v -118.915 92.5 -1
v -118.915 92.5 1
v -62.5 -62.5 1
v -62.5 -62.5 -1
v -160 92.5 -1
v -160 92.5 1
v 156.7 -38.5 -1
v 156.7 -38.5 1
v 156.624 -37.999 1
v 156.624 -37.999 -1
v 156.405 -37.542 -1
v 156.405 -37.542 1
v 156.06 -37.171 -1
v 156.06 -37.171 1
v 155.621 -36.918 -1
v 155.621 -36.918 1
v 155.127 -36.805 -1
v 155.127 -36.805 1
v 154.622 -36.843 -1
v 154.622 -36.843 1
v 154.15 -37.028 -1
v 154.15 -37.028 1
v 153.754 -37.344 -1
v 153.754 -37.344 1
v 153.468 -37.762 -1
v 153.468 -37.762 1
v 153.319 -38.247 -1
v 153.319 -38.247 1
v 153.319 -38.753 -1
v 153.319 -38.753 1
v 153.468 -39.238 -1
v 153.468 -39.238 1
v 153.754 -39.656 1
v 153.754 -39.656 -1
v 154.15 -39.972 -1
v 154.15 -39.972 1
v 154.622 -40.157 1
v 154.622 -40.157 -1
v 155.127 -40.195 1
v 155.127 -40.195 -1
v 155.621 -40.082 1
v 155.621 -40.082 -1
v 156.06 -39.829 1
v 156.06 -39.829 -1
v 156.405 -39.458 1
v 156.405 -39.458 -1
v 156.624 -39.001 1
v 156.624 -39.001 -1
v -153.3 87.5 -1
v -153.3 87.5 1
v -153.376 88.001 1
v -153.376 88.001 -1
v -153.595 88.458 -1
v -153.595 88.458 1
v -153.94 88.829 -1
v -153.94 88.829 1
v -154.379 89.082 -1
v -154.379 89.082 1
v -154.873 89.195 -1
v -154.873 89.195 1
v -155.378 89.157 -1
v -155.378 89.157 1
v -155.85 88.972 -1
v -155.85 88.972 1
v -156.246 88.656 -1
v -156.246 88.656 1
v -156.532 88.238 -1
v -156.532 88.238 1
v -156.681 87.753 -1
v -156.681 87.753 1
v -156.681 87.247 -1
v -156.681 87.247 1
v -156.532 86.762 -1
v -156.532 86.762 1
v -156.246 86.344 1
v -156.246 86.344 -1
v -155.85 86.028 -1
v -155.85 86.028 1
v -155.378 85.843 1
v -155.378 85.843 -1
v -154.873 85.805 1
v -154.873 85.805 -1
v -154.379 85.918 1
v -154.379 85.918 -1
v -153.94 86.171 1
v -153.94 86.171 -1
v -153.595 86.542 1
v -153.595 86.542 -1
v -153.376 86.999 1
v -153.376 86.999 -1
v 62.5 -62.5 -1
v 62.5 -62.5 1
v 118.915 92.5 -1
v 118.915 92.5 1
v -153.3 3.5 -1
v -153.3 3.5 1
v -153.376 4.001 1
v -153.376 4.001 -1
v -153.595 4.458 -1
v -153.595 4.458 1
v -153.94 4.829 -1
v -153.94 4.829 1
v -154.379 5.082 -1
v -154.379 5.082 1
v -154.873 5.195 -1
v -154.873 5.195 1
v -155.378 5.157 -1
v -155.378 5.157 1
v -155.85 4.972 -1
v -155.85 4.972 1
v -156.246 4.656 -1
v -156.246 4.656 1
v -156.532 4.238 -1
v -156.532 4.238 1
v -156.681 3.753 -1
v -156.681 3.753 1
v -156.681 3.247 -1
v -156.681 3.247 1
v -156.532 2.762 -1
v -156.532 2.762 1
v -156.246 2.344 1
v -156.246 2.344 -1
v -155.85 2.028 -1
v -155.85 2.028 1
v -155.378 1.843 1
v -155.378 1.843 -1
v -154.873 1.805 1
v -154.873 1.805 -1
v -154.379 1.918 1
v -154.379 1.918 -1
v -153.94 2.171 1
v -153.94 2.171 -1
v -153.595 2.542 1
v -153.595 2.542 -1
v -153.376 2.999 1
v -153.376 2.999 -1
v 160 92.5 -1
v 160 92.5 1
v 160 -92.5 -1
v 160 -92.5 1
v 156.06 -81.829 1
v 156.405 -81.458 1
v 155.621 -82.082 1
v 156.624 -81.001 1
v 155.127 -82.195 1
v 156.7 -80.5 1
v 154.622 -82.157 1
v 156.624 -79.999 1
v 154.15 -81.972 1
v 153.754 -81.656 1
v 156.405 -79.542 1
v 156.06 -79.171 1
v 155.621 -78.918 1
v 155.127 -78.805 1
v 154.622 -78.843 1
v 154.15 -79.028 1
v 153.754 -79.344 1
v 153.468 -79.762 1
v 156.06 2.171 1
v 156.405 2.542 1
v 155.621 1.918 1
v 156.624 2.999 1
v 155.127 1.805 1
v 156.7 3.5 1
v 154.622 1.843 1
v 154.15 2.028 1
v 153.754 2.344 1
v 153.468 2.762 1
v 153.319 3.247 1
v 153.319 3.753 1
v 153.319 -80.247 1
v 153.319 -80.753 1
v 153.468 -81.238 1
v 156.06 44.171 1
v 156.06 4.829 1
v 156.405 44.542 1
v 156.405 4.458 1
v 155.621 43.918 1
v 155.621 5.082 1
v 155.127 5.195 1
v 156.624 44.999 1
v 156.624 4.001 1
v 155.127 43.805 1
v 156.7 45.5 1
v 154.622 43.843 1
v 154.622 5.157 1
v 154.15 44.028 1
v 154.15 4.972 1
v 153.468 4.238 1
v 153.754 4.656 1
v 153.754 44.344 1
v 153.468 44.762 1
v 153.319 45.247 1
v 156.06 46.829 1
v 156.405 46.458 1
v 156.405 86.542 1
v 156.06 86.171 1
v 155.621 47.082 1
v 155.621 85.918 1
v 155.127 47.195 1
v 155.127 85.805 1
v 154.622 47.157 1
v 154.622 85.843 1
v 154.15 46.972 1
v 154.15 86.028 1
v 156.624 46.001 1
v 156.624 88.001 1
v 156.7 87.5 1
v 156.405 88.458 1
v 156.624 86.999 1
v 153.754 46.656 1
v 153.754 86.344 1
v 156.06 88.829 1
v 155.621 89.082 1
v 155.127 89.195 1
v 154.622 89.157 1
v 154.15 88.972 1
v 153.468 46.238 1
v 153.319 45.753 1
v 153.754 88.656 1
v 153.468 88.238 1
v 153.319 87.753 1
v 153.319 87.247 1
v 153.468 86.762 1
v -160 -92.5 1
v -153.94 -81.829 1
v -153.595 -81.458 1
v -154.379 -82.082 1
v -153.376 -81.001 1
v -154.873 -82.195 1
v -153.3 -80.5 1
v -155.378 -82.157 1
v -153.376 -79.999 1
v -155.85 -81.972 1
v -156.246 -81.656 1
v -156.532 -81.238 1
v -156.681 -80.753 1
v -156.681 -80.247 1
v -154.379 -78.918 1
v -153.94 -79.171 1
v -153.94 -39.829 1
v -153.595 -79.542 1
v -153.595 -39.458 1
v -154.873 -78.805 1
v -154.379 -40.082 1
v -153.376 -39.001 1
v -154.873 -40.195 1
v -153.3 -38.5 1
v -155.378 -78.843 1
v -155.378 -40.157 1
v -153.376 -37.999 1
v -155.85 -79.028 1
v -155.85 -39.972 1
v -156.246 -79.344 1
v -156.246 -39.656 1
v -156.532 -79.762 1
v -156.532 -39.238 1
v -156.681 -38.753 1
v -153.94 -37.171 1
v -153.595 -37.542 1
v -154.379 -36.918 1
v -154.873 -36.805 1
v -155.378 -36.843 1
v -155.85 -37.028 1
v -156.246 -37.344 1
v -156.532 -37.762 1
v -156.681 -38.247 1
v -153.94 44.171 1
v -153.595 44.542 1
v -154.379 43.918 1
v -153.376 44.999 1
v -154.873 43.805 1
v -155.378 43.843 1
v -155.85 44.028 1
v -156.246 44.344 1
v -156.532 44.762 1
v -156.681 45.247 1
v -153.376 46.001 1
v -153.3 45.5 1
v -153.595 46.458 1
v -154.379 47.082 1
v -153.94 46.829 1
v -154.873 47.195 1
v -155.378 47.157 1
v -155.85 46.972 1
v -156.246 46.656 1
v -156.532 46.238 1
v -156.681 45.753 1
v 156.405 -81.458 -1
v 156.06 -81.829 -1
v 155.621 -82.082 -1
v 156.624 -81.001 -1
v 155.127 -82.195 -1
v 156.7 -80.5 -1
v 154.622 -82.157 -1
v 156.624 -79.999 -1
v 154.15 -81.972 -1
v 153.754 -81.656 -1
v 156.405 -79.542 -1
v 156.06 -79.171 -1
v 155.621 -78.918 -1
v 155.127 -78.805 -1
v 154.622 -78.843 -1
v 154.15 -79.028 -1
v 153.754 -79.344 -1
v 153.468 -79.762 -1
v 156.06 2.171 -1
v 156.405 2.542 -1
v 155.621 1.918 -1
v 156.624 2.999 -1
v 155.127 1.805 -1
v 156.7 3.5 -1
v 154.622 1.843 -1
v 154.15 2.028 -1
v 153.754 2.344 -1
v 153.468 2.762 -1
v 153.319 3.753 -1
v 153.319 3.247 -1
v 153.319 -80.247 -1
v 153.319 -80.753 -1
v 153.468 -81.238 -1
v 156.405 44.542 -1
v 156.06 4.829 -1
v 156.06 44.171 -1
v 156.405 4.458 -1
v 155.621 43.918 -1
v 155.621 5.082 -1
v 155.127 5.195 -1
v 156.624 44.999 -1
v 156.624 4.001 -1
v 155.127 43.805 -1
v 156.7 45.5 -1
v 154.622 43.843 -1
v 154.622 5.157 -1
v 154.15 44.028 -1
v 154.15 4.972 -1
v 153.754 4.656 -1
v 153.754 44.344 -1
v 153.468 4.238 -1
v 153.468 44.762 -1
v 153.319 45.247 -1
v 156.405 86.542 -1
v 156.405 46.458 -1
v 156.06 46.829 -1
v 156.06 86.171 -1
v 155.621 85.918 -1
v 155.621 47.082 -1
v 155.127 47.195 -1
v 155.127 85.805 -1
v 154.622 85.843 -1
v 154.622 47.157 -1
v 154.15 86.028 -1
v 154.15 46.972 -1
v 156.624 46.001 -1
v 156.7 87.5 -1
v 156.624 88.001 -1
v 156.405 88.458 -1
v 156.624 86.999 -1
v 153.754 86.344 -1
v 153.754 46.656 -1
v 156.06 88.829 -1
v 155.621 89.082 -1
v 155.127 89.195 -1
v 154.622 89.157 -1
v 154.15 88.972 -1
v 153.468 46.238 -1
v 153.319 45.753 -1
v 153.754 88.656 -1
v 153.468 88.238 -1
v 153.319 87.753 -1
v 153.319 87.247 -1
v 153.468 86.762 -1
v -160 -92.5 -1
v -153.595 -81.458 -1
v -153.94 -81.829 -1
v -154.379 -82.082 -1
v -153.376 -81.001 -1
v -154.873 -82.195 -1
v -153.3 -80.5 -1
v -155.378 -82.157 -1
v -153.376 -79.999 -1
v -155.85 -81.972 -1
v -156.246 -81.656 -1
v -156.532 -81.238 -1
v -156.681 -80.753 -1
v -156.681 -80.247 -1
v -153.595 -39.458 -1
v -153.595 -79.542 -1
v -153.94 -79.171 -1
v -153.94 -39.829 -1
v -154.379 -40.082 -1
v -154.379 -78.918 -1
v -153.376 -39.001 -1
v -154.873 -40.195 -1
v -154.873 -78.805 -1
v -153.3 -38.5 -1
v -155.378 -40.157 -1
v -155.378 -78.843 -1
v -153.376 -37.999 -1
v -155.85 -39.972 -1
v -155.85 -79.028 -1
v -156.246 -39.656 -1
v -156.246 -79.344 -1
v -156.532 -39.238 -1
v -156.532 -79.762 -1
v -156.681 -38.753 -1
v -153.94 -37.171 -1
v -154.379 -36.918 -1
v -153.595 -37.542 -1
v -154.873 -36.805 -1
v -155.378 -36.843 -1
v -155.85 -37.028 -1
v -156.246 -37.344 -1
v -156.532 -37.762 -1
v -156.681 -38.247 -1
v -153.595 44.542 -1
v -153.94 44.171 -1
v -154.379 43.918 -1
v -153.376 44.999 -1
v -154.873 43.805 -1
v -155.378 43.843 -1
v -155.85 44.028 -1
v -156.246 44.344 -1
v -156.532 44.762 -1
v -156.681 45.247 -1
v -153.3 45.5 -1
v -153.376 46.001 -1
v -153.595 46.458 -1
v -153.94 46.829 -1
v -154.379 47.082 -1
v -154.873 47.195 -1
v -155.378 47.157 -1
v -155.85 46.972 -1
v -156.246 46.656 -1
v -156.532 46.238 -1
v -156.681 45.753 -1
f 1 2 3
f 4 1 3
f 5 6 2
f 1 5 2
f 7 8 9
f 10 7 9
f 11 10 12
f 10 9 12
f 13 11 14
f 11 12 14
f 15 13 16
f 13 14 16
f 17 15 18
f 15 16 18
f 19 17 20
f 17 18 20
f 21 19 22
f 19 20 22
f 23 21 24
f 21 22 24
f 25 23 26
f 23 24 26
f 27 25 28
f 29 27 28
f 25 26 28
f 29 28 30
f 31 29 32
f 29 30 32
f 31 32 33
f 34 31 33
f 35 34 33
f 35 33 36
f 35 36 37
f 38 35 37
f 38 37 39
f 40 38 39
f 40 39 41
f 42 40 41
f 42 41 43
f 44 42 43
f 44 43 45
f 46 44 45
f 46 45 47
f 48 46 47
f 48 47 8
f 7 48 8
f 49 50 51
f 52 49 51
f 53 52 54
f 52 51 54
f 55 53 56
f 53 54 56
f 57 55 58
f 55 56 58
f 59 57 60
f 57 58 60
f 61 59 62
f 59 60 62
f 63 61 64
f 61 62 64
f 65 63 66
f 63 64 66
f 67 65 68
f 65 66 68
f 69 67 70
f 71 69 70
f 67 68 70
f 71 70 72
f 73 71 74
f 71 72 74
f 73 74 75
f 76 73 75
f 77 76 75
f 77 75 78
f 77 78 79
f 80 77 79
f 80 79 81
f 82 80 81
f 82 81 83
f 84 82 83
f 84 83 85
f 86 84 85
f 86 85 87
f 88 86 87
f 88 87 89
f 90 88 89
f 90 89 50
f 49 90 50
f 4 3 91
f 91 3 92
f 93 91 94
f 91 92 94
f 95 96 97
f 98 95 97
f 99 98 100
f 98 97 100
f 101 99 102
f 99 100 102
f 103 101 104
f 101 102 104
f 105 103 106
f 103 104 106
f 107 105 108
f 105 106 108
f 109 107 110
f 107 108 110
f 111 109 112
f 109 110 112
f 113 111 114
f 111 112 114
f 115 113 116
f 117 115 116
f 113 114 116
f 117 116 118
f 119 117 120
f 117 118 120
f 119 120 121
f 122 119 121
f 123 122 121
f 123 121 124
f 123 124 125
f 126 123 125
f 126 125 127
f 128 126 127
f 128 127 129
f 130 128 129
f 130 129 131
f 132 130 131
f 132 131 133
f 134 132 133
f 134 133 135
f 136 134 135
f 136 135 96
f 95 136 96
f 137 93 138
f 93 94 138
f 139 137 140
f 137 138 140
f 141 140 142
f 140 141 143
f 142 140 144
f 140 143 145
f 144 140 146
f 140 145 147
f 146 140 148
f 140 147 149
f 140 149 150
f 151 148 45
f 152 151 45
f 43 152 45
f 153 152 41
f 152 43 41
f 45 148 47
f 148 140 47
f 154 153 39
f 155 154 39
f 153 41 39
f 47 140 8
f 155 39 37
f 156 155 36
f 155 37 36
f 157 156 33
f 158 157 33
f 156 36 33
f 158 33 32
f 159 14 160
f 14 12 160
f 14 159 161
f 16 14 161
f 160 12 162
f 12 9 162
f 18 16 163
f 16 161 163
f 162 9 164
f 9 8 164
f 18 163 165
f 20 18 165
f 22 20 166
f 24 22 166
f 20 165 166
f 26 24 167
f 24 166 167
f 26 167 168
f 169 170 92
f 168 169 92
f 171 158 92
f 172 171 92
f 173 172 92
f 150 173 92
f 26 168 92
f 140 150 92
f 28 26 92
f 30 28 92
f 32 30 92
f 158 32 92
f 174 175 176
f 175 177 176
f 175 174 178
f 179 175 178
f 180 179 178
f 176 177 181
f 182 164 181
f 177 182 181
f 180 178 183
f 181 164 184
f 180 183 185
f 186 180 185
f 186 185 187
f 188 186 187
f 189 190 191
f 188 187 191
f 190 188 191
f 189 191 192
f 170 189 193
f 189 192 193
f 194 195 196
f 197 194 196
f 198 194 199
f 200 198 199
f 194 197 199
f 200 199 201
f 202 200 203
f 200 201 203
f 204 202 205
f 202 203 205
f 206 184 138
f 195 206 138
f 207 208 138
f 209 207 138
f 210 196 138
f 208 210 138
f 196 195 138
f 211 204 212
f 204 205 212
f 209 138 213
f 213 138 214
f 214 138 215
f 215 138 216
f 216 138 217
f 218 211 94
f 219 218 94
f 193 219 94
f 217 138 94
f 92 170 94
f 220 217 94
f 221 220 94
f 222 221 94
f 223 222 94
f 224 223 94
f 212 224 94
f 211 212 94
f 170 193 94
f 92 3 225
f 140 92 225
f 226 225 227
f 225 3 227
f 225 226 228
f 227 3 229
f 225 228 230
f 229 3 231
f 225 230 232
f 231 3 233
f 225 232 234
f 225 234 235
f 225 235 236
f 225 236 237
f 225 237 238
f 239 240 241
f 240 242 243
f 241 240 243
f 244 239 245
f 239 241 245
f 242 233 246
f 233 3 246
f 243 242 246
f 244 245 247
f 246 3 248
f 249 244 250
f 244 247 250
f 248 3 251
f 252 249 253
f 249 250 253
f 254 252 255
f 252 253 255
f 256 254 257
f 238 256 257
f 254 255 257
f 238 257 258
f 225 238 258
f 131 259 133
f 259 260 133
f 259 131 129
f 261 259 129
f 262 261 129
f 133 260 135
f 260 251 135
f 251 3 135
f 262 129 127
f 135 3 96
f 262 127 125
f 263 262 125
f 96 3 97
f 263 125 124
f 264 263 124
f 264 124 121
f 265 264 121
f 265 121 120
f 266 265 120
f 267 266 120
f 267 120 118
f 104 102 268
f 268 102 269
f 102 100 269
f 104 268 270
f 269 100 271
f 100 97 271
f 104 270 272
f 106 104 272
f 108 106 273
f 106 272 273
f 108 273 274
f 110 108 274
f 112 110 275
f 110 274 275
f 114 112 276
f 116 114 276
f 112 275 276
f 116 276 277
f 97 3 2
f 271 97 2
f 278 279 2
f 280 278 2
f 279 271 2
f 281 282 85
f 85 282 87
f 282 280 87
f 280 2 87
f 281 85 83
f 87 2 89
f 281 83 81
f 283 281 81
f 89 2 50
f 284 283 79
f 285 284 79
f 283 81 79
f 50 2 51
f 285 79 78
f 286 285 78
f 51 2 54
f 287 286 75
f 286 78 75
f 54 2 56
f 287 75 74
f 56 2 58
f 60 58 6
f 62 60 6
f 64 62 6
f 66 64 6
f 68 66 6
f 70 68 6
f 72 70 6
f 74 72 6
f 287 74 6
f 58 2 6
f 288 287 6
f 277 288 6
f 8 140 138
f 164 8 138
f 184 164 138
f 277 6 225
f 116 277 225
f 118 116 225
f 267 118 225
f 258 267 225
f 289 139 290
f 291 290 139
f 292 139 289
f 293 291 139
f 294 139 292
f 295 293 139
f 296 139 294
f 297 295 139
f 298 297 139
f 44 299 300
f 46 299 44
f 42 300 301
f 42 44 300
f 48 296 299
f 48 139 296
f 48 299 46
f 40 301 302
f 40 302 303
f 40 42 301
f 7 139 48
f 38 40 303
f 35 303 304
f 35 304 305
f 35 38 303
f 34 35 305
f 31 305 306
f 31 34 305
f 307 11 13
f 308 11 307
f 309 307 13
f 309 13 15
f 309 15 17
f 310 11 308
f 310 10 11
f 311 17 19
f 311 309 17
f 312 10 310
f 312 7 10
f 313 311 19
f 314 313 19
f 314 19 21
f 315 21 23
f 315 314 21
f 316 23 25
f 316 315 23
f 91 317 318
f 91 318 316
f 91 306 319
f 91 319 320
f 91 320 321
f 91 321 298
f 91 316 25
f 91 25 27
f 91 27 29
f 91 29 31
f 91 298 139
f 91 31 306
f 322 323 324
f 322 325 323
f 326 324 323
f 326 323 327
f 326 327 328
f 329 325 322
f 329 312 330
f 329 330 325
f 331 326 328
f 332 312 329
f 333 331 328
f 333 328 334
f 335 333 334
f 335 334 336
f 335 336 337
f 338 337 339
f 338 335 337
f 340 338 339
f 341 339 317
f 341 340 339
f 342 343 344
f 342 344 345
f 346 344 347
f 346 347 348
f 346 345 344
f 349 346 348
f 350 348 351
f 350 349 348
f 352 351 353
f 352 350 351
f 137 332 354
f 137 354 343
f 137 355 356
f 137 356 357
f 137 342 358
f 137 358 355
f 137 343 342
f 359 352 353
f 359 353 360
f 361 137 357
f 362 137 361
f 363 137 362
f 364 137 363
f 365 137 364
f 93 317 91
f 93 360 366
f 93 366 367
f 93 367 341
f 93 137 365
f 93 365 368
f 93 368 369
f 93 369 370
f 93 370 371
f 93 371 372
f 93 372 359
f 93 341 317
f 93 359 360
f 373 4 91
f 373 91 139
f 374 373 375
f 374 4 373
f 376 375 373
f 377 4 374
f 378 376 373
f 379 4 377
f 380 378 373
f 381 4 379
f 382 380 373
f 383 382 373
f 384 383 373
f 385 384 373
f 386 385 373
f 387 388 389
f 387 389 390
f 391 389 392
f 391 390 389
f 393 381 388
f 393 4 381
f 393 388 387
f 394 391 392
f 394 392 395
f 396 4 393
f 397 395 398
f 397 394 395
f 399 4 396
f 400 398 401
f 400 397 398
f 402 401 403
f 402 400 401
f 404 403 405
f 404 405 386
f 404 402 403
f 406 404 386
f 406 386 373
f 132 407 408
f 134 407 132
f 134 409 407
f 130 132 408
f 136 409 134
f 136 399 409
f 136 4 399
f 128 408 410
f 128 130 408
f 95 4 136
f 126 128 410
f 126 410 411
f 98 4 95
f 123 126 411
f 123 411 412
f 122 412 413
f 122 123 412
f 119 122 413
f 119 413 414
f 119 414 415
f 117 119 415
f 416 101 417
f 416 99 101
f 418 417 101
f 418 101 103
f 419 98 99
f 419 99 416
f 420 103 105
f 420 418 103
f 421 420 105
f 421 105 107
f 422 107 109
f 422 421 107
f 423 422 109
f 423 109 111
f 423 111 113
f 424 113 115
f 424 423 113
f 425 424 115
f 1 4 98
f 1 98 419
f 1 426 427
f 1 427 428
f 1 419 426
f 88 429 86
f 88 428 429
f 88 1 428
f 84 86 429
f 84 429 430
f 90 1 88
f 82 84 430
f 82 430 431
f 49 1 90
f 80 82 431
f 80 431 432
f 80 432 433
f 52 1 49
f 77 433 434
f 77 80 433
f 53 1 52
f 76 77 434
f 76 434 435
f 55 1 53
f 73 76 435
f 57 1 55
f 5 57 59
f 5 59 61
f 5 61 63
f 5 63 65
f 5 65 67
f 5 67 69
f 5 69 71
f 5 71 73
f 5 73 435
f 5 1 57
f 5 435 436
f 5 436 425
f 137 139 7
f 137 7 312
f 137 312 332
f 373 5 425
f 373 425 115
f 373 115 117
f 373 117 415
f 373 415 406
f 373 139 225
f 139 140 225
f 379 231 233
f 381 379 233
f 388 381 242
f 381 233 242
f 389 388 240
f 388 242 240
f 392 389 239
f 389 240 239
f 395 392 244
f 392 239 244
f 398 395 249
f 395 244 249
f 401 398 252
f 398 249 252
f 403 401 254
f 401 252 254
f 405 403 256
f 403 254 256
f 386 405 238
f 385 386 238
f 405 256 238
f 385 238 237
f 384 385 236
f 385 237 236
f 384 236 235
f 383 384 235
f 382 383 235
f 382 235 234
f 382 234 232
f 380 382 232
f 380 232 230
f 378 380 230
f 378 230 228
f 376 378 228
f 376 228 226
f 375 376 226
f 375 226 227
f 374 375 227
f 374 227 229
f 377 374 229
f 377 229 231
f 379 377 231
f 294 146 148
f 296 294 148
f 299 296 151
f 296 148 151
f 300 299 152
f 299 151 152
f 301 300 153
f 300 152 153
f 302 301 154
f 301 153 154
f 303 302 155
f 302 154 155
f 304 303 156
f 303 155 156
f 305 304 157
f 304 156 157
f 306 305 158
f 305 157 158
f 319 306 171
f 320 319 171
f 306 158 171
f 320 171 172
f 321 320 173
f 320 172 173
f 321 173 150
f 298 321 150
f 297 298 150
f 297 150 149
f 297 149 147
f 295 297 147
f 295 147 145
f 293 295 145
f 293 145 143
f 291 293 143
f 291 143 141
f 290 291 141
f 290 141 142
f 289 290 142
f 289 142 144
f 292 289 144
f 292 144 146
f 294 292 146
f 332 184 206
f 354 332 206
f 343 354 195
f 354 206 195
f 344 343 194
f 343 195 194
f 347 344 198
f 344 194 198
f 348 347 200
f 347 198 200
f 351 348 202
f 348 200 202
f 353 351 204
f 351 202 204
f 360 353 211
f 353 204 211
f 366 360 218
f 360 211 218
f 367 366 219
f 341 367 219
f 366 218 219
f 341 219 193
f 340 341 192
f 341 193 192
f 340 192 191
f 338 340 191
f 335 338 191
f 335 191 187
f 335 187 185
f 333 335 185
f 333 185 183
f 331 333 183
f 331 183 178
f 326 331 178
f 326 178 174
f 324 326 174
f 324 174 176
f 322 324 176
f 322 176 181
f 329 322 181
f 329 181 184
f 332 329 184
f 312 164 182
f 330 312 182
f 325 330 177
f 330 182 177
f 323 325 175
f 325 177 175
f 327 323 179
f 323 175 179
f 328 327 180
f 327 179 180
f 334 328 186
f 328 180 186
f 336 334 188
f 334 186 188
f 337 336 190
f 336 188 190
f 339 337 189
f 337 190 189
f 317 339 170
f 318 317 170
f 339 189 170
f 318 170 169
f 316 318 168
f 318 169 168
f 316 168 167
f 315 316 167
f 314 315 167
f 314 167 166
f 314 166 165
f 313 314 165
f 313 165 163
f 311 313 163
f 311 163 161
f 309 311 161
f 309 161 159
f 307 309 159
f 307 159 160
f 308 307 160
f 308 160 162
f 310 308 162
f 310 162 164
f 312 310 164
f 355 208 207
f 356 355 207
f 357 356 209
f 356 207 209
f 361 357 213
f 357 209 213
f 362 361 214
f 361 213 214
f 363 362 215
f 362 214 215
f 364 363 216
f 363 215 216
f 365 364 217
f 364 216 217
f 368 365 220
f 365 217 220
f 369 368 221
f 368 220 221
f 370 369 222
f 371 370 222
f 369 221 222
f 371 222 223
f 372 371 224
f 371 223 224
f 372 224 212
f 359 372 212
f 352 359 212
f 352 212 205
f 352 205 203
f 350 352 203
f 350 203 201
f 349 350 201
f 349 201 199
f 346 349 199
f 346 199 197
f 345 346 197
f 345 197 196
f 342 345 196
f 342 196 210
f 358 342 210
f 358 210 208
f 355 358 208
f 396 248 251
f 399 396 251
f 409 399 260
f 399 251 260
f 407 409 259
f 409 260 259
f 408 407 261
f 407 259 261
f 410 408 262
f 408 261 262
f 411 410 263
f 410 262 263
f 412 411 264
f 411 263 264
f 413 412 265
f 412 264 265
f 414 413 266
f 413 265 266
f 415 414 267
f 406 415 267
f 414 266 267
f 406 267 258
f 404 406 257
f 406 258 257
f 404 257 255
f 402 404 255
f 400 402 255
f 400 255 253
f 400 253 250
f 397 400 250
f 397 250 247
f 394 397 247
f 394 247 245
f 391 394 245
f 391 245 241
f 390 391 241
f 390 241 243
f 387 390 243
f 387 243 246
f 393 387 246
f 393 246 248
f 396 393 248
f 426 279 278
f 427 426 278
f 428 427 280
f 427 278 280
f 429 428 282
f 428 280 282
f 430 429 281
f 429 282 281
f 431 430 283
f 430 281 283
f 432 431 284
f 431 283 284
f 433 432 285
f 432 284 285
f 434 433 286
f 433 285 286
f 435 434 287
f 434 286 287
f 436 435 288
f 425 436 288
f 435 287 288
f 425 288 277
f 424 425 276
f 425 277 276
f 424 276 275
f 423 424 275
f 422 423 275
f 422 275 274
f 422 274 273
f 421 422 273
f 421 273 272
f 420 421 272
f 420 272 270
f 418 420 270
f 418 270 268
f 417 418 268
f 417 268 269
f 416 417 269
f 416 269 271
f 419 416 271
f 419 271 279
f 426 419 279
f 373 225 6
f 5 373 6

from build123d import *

# Parameters (mm, degrees)
EXTRUDE_1_DEPTH     = 1
SKETCH_2_R          = 1.7
CUT_EXTRUDE_1_DEPTH = 10


with BuildPart() as part:
    # Эскиз1 → Бобышка-Вытянуть1 (new, symmetric)
    with BuildSketch(Plane.XY):
        Polygon((-118.915386311, 92.5), (-62.5, -62.5), (62.5, -62.5), (118.915386311, 92.5), (160, 92.5), (160, -92.5), (-160, -92.5), (-160, 92.5), align=None)
    extrude(amount=EXTRUDE_1_DEPTH, both=True)

    # Эскиз2 → Вырез-Вытянуть1 (cut)
    with BuildSketch(Plane.XY.offset(1)):
        with Locations((-155, 87.5)):
            Circle(SKETCH_2_R)
        with Locations((-155, 45.5)):
            Circle(SKETCH_2_R)
        with Locations((-155, 3.5)):
            Circle(SKETCH_2_R)
        with Locations((-155, -38.5)):
            Circle(SKETCH_2_R)
        with Locations((-155, -80.5)):
            Circle(SKETCH_2_R)
        with Locations((155, -80.5)):
            Circle(SKETCH_2_R)
        with Locations((155, -38.5)):
            Circle(SKETCH_2_R)
        with Locations((155, 3.5)):
            Circle(SKETCH_2_R)
        with Locations((155, 45.5)):
            Circle(SKETCH_2_R)
        with Locations((155, 87.5)):
            Circle(SKETCH_2_R)
    extrude(amount=-CUT_EXTRUDE_1_DEPTH, mode=Mode.SUBTRACT)


solid = part.part
